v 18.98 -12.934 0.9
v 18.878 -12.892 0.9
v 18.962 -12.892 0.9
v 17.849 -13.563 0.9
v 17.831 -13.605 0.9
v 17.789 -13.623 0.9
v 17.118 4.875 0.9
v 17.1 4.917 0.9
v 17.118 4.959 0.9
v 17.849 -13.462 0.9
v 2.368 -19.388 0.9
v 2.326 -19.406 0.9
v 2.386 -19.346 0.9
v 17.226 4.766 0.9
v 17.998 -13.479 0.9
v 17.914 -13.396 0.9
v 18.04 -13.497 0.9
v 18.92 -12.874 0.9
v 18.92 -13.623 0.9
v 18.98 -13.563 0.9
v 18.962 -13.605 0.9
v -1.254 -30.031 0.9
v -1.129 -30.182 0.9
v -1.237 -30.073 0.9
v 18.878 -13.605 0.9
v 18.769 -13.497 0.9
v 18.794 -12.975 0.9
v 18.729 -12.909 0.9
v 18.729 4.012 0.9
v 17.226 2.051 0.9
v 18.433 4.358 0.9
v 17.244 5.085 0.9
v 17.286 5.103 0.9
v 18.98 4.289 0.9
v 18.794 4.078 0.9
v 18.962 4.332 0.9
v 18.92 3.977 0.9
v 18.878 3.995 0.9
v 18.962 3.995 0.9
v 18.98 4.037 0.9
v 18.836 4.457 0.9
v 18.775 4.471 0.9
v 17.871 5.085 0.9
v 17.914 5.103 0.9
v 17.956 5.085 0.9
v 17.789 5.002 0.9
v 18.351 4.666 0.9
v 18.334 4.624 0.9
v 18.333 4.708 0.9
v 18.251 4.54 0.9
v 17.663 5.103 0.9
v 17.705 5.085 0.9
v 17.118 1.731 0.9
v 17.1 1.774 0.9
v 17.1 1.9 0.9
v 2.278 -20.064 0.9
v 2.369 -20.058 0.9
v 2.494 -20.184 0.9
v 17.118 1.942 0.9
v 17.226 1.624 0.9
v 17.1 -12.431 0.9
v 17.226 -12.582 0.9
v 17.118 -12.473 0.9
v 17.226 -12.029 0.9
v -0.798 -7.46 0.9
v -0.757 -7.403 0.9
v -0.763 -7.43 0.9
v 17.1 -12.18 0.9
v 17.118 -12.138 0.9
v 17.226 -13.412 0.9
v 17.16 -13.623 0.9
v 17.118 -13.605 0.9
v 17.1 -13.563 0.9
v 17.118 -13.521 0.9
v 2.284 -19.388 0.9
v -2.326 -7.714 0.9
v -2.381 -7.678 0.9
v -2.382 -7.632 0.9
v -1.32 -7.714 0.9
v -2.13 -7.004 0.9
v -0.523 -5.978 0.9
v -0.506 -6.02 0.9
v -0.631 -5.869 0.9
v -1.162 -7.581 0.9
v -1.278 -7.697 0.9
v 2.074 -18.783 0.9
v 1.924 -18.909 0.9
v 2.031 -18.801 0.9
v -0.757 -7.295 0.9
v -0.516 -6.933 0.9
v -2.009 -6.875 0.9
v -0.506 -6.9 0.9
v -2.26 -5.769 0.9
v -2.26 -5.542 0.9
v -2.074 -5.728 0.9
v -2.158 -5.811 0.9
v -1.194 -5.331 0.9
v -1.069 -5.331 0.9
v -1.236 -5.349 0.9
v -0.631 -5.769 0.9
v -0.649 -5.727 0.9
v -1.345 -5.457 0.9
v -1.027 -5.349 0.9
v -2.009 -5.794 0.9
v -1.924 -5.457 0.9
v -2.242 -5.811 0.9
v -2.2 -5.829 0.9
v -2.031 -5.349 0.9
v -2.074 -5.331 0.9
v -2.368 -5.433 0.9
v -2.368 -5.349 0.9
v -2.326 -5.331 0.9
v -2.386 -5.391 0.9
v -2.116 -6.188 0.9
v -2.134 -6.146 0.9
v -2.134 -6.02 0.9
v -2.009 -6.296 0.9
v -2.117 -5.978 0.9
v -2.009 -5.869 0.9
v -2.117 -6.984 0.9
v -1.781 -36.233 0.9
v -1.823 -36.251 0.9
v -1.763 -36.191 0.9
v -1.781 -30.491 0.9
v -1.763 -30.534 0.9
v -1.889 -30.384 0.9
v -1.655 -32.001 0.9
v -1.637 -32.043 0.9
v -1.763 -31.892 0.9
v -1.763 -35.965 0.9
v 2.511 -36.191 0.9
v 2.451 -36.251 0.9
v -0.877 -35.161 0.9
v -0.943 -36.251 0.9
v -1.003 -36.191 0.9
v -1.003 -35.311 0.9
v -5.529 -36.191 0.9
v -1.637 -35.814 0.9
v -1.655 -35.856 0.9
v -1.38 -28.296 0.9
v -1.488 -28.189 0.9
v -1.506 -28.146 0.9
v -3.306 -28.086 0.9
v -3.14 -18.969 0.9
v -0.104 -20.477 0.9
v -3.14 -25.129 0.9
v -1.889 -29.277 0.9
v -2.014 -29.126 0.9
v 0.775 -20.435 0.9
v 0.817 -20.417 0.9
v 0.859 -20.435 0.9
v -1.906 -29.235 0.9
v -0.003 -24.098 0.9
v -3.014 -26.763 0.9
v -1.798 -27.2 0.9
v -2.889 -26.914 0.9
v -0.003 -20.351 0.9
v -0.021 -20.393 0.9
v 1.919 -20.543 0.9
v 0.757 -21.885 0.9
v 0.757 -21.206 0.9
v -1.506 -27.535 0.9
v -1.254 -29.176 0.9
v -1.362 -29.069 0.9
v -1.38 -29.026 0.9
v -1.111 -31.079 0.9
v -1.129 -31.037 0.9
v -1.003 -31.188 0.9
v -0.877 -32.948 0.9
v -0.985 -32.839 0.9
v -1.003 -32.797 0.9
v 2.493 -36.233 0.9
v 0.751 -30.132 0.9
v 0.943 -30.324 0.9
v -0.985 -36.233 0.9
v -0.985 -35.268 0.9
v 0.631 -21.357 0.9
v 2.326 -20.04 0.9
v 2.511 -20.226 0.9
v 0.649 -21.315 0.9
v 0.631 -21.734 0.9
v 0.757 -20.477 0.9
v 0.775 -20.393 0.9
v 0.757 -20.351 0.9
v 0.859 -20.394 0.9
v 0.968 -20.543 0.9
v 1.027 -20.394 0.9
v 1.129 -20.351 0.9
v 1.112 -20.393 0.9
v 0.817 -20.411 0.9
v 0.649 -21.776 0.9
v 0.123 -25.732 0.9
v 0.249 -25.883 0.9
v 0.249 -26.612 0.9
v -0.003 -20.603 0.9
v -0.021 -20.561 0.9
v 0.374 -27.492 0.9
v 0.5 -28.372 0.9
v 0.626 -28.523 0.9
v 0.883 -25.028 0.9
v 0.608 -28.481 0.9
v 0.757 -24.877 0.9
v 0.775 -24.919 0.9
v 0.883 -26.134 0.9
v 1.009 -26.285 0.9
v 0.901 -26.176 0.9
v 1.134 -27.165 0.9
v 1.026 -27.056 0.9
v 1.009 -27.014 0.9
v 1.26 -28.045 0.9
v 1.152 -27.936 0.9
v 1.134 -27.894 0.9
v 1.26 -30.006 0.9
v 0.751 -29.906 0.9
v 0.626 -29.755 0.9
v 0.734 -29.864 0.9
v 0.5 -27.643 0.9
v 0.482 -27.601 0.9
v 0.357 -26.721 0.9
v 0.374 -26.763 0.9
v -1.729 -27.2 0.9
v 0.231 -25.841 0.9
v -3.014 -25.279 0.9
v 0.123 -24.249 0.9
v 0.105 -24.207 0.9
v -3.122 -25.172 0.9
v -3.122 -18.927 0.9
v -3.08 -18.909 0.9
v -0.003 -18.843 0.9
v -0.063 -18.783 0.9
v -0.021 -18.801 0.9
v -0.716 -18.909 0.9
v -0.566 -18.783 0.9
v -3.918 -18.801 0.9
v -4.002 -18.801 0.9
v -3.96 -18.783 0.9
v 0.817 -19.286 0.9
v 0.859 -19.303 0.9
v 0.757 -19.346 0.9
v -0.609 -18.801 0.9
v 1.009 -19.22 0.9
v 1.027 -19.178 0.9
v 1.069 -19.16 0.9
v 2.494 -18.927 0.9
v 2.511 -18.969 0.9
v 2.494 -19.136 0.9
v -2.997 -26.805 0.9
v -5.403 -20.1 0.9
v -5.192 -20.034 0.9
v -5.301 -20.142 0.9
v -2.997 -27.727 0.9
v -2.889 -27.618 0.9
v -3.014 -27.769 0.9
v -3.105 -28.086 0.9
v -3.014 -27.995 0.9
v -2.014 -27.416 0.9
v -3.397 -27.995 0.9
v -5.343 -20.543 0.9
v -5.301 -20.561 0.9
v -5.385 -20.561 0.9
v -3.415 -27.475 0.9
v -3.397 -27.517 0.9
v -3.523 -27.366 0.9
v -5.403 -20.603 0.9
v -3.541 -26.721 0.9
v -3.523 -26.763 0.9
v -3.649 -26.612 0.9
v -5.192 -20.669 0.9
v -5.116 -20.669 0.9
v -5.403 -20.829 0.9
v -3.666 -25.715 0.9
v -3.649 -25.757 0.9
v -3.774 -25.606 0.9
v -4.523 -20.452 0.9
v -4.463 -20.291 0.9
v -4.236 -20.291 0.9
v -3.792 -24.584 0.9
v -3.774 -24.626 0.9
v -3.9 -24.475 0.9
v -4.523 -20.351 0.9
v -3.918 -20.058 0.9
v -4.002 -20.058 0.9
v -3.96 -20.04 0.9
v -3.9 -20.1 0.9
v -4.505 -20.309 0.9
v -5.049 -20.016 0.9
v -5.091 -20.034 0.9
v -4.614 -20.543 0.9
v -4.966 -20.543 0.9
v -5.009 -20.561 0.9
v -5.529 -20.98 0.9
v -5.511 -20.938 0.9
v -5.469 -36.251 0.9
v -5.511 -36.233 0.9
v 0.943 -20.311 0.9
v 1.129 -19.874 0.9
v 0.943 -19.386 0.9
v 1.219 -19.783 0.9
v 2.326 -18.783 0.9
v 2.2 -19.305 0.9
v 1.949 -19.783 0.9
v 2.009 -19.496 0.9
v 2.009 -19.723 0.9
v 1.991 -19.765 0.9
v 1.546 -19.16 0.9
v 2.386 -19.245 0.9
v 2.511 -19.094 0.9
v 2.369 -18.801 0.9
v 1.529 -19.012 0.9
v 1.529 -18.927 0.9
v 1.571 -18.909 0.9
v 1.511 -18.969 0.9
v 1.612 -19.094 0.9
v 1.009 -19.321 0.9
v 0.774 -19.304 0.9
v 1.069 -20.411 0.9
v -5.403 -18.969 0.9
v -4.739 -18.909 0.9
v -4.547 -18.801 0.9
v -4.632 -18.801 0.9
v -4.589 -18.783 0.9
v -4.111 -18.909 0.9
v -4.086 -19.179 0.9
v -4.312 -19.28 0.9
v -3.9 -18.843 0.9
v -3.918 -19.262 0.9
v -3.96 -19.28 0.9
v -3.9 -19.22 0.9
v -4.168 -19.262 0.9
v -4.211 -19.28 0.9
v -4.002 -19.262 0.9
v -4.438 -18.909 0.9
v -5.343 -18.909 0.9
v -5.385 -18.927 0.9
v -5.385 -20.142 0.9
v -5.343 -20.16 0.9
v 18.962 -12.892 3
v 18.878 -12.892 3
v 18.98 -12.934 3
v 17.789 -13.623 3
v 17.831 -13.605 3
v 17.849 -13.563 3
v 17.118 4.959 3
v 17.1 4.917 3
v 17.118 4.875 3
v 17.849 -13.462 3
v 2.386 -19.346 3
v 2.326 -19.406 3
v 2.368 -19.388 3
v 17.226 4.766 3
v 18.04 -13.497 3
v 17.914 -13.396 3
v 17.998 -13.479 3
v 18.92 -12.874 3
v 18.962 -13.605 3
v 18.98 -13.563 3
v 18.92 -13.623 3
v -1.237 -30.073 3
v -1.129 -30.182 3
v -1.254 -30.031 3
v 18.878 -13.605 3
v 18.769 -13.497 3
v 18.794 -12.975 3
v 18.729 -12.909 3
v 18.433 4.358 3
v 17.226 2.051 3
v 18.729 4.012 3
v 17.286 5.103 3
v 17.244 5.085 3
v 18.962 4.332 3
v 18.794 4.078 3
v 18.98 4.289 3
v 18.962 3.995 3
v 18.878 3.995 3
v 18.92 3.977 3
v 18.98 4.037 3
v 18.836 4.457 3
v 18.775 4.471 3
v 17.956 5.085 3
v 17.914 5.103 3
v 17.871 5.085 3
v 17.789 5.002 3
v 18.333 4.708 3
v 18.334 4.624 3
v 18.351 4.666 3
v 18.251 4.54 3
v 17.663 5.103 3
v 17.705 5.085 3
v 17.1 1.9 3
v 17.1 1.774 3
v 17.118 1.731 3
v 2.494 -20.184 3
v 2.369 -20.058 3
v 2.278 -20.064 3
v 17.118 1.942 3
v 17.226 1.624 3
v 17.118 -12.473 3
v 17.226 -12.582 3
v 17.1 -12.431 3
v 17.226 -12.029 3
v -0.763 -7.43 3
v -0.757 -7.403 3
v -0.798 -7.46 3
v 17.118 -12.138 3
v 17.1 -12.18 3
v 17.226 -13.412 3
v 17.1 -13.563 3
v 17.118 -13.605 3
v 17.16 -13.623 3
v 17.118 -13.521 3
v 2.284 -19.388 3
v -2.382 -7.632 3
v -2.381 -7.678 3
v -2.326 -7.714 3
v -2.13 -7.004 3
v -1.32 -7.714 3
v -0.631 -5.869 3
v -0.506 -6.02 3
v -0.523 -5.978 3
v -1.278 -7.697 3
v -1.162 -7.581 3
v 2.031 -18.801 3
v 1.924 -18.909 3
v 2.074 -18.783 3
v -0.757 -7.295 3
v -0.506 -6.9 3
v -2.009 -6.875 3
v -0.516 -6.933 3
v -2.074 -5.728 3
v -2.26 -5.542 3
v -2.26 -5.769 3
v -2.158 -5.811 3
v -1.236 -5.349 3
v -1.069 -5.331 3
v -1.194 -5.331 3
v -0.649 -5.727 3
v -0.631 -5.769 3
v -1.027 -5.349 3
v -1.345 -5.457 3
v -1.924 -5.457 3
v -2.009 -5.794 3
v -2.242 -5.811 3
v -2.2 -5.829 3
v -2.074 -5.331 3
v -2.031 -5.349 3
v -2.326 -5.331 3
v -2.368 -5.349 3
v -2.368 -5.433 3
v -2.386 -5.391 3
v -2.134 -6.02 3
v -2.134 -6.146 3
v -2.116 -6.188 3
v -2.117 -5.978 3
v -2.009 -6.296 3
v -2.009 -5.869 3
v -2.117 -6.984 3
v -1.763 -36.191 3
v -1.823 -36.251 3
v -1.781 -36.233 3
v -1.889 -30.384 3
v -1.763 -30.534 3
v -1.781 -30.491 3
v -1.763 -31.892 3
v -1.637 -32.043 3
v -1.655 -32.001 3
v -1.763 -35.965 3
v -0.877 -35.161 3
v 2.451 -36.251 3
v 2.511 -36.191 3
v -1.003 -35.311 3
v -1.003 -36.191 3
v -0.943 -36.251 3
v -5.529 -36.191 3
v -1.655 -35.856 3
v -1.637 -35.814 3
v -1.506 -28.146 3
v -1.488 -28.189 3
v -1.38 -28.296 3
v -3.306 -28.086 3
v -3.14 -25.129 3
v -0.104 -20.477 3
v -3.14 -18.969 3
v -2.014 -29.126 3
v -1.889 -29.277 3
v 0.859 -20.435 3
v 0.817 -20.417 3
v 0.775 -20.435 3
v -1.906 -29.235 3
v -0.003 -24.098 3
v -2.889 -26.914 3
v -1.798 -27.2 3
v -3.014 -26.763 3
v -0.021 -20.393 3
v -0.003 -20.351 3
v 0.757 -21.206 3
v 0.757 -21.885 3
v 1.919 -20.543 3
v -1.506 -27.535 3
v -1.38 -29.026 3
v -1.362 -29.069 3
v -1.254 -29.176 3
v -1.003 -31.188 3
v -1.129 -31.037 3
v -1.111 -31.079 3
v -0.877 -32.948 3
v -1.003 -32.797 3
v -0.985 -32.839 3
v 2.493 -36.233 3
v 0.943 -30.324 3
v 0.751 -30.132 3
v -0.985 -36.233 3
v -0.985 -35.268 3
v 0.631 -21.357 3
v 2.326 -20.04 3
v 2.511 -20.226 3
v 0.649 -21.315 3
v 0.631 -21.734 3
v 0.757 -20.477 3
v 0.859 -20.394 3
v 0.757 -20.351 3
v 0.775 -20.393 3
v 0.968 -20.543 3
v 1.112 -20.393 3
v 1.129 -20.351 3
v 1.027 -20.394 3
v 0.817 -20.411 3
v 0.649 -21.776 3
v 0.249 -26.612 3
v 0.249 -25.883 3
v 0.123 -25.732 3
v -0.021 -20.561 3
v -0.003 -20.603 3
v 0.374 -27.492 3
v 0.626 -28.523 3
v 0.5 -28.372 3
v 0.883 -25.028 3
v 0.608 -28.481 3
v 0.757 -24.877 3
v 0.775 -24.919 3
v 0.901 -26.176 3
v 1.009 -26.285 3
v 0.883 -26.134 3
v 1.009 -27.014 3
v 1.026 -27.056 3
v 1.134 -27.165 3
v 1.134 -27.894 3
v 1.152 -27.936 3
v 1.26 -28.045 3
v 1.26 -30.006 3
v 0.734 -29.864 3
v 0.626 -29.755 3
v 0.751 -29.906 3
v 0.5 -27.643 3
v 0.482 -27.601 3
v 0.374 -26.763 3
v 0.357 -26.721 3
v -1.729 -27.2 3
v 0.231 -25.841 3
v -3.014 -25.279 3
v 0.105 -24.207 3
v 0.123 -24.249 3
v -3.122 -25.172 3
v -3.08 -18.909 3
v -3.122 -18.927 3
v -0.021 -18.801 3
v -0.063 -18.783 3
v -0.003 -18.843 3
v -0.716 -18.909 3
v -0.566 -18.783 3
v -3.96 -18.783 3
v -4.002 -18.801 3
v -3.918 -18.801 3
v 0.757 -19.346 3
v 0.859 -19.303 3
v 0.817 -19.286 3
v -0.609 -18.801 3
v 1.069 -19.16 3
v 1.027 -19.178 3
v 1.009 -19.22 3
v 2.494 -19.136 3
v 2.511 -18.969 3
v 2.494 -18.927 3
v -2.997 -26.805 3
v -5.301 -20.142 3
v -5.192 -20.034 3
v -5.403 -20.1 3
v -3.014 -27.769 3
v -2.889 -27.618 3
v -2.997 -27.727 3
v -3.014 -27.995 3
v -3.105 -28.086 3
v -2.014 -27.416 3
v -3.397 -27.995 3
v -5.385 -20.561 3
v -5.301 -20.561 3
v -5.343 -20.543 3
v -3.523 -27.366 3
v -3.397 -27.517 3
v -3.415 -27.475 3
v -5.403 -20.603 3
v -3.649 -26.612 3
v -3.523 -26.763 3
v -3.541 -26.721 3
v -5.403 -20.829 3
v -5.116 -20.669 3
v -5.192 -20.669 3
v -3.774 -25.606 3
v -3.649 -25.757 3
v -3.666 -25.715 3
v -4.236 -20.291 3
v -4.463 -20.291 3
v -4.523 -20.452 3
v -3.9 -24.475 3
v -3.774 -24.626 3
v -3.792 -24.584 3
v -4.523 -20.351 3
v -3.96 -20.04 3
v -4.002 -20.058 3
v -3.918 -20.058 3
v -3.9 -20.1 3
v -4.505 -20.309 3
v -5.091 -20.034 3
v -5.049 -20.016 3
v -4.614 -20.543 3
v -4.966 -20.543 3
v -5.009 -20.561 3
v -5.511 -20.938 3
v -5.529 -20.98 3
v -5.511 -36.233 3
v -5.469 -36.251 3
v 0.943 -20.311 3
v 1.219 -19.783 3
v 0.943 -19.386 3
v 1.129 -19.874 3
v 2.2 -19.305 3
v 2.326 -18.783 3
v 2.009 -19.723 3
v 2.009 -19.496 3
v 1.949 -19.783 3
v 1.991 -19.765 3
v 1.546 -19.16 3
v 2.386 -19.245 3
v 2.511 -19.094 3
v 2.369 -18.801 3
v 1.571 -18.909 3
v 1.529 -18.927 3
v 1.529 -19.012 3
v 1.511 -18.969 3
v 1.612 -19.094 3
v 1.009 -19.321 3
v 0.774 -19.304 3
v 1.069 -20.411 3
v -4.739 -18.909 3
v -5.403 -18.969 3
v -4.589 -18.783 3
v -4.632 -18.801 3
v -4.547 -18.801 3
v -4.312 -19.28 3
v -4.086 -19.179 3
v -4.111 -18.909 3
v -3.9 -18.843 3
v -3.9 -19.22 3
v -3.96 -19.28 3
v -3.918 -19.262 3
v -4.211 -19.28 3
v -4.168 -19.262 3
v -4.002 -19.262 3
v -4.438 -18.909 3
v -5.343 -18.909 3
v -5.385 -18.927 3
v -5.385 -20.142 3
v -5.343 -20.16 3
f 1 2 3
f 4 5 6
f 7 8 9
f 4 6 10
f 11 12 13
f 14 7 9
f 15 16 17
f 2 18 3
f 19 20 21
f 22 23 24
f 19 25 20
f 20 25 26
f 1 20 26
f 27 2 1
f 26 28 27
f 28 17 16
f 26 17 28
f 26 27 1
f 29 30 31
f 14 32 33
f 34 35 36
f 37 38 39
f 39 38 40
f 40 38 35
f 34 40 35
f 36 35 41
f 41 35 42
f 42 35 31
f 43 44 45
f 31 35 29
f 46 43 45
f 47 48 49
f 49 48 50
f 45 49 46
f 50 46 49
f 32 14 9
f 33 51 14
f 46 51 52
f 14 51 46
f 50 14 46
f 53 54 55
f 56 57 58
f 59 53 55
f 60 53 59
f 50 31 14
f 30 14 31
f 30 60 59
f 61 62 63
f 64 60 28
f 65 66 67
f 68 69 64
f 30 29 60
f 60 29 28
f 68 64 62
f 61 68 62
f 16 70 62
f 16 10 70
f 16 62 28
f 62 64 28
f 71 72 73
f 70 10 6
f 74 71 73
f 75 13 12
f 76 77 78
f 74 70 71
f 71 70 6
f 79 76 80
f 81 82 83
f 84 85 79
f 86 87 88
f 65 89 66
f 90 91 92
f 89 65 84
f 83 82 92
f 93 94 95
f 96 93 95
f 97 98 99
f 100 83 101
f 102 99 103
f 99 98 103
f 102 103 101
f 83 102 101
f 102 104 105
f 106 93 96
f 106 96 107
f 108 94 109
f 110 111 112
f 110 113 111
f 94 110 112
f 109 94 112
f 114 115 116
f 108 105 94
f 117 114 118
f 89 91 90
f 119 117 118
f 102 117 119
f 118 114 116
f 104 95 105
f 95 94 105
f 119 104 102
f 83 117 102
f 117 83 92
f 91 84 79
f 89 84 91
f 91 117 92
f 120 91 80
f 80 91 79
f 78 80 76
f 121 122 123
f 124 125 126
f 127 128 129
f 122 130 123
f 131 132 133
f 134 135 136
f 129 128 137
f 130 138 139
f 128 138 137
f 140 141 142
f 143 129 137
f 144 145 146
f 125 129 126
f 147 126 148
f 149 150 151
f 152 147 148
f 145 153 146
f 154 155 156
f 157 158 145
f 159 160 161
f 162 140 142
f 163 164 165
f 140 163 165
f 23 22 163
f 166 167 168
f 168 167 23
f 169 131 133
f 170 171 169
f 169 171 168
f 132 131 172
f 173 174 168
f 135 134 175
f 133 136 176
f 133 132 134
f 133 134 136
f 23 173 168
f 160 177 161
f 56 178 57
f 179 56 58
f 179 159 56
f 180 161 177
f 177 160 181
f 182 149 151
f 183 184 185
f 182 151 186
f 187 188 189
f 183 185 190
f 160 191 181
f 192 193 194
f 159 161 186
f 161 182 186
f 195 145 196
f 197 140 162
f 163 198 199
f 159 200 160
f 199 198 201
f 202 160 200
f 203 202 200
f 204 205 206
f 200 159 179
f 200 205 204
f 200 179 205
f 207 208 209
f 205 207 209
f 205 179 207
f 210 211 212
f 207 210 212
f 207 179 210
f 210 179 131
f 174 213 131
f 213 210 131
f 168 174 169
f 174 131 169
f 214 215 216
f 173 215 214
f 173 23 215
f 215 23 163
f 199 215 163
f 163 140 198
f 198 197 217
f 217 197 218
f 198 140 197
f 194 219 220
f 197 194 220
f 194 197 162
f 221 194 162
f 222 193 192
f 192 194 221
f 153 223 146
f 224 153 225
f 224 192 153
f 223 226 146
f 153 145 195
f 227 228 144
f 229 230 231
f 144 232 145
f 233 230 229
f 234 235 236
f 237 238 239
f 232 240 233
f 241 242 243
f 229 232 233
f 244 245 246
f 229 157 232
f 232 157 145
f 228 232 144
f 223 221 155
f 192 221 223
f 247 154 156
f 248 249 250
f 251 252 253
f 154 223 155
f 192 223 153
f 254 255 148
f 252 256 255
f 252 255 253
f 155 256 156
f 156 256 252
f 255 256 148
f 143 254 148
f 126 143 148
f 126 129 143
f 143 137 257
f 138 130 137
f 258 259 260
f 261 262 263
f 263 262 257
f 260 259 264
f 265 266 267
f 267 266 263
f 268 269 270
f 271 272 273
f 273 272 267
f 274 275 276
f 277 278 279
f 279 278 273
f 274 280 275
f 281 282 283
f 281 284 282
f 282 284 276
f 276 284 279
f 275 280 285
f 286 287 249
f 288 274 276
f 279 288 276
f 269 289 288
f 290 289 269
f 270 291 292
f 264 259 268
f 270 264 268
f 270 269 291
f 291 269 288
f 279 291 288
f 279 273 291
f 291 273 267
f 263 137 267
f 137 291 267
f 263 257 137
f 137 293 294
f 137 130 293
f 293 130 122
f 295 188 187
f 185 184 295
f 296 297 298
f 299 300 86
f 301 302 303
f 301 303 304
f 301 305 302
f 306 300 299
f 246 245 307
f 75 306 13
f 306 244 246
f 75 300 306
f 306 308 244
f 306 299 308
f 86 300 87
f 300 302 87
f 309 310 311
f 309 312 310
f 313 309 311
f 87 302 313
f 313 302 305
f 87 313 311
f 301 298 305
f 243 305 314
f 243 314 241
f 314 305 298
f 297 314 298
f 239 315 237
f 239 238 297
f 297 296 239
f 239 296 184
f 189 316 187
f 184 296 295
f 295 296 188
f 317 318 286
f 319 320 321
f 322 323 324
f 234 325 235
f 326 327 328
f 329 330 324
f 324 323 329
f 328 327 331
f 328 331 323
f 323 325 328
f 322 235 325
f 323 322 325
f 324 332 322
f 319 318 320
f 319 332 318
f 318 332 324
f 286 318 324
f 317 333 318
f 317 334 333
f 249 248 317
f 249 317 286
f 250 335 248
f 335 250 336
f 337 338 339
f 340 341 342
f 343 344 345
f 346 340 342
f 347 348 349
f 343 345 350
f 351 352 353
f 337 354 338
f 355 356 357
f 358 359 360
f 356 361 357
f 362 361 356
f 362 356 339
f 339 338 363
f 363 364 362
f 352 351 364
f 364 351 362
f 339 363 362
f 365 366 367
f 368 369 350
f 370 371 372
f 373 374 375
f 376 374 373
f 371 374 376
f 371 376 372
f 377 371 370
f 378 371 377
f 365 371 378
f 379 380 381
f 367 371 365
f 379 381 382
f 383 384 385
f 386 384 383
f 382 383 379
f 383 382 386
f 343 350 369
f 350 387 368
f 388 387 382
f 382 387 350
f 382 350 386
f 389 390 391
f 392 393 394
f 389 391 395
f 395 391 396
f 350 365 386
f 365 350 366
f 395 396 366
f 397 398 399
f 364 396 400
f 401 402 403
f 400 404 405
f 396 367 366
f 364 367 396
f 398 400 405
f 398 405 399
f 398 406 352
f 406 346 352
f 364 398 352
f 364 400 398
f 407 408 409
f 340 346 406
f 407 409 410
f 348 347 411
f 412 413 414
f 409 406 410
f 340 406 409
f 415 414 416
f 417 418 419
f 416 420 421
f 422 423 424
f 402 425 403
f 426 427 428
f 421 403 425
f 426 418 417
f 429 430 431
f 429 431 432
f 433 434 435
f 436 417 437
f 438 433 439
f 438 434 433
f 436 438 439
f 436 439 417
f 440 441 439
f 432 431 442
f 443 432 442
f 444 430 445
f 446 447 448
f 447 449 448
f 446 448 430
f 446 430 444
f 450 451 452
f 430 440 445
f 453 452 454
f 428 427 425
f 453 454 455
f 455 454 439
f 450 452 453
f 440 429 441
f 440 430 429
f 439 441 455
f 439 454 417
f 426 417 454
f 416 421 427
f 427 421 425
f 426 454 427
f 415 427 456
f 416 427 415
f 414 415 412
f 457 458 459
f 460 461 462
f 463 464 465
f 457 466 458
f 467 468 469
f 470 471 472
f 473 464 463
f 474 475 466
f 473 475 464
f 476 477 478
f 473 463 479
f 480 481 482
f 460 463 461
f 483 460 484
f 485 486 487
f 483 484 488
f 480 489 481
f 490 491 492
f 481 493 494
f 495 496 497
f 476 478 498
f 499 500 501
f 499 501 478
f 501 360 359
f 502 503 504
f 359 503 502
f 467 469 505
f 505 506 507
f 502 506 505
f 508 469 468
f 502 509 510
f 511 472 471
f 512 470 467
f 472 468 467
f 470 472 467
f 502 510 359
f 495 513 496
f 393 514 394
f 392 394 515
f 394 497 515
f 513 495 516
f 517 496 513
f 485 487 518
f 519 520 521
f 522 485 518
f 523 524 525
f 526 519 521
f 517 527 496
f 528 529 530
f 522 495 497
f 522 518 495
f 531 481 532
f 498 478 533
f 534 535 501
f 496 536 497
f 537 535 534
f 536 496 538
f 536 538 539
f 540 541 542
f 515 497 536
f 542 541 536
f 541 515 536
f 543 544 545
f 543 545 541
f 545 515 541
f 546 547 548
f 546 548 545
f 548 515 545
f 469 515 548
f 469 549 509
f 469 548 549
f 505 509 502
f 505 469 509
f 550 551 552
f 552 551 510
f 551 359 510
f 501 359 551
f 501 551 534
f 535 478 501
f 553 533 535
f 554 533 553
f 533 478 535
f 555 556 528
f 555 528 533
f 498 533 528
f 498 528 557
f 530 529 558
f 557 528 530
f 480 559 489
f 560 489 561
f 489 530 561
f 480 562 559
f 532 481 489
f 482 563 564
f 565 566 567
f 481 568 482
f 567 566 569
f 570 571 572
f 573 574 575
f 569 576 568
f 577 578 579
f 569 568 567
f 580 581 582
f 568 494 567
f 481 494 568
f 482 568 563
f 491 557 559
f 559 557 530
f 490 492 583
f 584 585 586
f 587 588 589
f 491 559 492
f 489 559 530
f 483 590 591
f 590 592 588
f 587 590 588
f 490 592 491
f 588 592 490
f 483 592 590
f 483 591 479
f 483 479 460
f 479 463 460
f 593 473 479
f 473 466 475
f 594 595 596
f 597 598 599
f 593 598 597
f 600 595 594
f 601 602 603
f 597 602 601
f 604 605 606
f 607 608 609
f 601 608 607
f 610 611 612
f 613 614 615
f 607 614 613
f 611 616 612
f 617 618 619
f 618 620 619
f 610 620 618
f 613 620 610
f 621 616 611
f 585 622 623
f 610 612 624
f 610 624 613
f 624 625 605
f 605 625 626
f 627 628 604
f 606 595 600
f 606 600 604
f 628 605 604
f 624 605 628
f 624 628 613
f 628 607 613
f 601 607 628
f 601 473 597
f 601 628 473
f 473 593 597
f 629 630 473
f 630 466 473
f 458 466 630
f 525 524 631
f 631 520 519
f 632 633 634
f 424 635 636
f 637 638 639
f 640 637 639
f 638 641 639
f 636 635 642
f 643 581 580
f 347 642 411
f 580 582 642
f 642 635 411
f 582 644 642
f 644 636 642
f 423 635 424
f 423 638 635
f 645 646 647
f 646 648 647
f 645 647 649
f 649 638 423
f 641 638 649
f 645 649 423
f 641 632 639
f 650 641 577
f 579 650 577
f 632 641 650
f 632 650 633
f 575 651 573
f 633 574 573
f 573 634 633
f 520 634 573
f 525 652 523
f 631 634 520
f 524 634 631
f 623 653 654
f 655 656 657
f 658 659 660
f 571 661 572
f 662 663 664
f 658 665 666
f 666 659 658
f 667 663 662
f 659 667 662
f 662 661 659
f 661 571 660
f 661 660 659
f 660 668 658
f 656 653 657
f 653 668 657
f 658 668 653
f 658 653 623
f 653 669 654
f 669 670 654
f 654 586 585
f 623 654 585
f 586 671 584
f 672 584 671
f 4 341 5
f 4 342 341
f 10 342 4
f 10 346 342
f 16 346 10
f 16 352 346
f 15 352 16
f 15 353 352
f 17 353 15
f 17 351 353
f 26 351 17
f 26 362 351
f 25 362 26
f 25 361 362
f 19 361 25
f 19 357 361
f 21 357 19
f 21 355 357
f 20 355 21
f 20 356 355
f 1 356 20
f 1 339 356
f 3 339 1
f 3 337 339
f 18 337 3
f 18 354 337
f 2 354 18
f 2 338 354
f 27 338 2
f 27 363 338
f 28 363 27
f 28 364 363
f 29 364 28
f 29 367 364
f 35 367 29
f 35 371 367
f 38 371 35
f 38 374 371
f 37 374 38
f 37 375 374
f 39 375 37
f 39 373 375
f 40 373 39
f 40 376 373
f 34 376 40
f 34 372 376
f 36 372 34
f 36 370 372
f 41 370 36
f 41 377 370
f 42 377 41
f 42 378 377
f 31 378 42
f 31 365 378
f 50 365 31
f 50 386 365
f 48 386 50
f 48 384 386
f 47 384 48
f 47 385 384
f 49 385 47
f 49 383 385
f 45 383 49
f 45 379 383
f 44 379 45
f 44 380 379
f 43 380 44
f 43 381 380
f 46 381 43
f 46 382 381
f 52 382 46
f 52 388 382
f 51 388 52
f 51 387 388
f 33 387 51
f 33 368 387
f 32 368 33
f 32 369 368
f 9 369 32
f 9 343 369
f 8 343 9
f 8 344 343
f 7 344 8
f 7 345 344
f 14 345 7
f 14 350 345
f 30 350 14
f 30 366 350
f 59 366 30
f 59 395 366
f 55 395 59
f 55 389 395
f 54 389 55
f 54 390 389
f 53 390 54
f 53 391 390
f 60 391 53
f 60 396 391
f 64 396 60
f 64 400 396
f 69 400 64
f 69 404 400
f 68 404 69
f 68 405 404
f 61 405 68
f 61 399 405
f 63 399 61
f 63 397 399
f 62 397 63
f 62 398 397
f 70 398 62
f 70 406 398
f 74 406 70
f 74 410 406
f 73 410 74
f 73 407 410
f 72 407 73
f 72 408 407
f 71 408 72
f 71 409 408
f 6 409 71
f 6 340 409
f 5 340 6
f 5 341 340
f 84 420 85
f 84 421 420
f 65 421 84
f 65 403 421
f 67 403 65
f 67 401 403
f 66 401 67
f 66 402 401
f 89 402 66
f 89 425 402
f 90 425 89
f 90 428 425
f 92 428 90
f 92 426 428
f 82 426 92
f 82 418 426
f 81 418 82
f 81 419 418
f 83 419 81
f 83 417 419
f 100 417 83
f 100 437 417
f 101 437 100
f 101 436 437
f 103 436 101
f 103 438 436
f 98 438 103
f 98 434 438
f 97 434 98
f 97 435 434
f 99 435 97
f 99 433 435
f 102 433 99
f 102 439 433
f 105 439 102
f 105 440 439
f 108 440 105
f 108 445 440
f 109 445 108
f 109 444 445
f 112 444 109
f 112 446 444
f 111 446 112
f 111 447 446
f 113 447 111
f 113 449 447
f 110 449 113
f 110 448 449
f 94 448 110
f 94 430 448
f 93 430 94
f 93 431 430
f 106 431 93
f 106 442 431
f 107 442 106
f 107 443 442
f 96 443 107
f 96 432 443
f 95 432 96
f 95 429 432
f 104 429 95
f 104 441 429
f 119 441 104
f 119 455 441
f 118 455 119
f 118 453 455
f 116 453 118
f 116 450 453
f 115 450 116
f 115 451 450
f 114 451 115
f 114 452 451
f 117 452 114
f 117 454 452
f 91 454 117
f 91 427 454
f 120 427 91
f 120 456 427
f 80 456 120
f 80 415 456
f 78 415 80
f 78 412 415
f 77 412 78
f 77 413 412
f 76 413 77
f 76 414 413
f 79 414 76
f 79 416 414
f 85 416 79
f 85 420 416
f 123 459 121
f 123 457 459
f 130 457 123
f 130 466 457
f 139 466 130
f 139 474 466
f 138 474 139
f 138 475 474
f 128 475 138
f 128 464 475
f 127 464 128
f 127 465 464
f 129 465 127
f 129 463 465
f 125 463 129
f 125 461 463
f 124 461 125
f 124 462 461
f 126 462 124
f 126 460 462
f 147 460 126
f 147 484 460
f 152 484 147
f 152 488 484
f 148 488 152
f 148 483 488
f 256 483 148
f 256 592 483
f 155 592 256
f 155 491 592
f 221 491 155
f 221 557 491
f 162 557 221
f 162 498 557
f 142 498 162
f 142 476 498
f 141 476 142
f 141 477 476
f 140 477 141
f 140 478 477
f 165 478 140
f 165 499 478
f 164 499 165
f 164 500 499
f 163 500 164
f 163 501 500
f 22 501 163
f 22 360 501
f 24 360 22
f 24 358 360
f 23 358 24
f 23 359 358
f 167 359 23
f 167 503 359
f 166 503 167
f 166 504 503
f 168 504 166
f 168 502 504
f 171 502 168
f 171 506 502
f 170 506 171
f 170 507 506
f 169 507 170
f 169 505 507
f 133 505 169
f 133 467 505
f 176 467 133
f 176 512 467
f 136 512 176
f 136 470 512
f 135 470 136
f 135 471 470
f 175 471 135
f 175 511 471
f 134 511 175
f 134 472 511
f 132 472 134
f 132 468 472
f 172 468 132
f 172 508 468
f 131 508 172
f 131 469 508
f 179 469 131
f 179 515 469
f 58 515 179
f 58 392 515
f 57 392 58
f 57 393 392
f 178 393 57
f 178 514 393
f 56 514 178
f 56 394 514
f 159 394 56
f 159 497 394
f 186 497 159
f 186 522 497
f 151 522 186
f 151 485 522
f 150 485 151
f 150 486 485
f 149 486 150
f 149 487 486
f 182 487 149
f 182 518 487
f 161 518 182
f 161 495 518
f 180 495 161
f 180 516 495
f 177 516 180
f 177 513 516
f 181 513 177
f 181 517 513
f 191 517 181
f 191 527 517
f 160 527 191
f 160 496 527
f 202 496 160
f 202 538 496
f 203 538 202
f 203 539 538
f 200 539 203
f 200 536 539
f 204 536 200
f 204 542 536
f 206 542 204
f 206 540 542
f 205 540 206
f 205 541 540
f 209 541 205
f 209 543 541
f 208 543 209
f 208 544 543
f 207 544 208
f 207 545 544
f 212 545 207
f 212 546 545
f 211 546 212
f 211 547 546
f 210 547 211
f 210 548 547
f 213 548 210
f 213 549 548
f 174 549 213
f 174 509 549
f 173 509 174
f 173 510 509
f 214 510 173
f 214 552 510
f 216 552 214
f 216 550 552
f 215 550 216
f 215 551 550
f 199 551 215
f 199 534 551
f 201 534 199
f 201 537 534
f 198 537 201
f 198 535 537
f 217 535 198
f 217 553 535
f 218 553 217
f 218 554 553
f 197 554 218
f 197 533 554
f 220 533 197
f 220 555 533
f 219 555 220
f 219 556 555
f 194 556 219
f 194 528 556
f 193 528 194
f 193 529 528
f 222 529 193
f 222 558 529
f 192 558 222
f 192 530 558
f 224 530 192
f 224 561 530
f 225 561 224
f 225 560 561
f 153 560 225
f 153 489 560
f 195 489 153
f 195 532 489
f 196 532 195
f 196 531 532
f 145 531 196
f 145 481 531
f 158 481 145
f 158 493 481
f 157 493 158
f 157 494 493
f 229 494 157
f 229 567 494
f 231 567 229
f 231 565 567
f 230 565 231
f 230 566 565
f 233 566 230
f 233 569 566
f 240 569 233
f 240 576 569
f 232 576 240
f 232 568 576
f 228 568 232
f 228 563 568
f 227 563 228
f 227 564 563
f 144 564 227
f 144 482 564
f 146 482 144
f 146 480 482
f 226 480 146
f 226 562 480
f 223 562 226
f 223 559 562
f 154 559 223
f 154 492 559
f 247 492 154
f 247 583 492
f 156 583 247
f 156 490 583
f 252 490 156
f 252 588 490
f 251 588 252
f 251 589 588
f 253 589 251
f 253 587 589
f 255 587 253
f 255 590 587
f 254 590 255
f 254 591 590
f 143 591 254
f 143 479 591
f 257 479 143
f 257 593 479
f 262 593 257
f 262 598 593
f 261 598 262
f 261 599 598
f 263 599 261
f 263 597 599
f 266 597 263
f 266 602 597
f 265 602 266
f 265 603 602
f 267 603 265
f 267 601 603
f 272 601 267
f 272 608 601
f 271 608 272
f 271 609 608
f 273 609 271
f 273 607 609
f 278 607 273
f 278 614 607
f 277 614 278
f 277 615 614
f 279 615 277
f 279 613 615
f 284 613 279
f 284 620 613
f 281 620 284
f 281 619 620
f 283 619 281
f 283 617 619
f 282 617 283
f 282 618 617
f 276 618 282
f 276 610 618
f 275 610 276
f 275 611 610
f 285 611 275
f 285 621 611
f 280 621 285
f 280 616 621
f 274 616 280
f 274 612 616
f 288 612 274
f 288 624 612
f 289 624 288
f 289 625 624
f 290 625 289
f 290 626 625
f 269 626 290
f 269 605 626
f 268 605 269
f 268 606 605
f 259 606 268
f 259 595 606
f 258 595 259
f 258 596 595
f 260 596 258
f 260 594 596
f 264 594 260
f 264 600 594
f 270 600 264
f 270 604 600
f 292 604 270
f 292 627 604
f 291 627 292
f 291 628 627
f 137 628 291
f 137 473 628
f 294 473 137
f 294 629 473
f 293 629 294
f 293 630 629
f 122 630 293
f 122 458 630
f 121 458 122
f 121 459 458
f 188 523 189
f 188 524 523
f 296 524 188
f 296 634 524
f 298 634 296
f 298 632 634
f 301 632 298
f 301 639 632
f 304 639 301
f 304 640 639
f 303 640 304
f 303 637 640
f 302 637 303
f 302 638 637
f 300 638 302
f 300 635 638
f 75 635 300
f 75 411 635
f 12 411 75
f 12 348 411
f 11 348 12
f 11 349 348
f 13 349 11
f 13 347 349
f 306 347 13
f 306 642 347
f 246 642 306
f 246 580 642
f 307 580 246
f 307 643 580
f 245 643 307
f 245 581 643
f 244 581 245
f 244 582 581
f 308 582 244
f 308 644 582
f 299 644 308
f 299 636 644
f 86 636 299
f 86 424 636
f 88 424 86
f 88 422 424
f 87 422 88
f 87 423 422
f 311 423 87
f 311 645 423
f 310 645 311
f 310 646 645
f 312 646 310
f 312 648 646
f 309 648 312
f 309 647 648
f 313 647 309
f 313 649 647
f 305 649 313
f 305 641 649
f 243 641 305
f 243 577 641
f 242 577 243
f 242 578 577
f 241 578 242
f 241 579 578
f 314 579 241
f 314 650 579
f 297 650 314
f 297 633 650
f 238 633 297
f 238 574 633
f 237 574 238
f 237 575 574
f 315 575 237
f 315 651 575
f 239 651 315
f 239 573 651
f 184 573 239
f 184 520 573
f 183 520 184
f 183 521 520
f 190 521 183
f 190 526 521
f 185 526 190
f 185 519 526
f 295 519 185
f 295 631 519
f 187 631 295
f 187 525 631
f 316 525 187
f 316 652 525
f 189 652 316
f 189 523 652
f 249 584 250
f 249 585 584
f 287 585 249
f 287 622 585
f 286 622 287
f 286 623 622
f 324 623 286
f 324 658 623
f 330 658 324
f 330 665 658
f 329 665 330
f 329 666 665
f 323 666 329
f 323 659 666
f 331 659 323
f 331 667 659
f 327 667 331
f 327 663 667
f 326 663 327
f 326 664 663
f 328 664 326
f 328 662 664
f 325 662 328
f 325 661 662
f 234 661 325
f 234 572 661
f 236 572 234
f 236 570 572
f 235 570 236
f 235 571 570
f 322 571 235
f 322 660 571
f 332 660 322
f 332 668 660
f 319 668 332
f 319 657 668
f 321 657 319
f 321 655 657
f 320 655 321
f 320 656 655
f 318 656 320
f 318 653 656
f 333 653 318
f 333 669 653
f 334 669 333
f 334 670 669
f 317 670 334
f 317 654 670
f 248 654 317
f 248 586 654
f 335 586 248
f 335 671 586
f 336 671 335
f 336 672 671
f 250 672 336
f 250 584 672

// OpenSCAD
$fn = 24;
translate([0, -2.500, 0.900])
  linear_extrude(height=2.100) {
offset(r=0.06, $fn=8) {
    polygon(points=[[2.326,-16.343],[2.074,-16.343],[1.949,-16.469],[1.069,-16.469],[1.571,-16.469],[1.697,-16.594],[1.571,-16.720],[1.069,-16.720],[1.069,-16.846],[0.943,-16.971],[0.817,-16.846],[0.817,-16.469],[0.817,-18.731],[0.691,-18.857],[0.691,-19.234],[0.817,-19.360],[0.817,-22.377],[0.943,-22.503],[0.943,-23.634],[1.069,-23.760],[1.069,-24.514],[1.194,-24.640],[1.194,-25.394],[1.320,-25.520],[1.320,-27.531],[0.943,-27.909],[0.691,-27.657],[0.691,-27.406],[0.566,-27.280],[0.566,-26.023],[0.440,-25.897],[0.440,-25.143],[0.314,-25.017],[0.314,-24.263],[0.189,-24.137],[0.189,-23.383],[0.063,-23.257],[0.063,-21.749],[-0.063,-21.623],[-0.063,-18.103],[-0.189,-17.977],[-0.063,-17.851],[-0.063,-16.343],[-0.566,-16.343],[-0.691,-16.469],[-3.080,-16.469],[-3.080,-22.629],[-2.954,-22.754],[-2.954,-24.263],[-2.829,-24.389],[-2.829,-25.143],[-2.954,-25.269],[-2.954,-25.520],[-3.080,-25.646],[-3.331,-25.646],[-3.457,-25.520],[-3.457,-25.017],[-3.583,-24.891],[-3.583,-24.263],[-3.709,-24.137],[-3.709,-23.257],[-3.834,-23.131],[-3.834,-22.126],[-3.960,-22.000],[-3.960,-17.600],[-4.211,-17.851],[-4.463,-17.851],[-4.463,-17.977],[-4.589,-18.103],[-4.966,-18.103],[-5.091,-18.229],[-5.217,-18.229],[-5.343,-18.103],[-5.343,-18.354],[-5.469,-18.480],[-5.469,-33.691],[-1.823,-33.691],[-1.823,-33.440],[-1.697,-33.314],[-1.697,-29.543],[-1.823,-29.417],[-1.823,-28.034],[-1.949,-27.909],[-1.949,-26.777],[-2.074,-26.651],[-2.074,-24.891],[-1.823,-24.640],[-1.697,-24.640],[-1.446,-25.017],[-1.446,-25.646],[-1.320,-25.771],[-1.320,-26.526],[-1.194,-26.651],[-1.194,-27.531],[-1.069,-27.657],[-1.069,-28.537],[-0.943,-28.663],[-0.943,-30.297],[-0.817,-30.423],[-0.817,-32.686],[-0.943,-32.811],[-0.943,-33.691],[2.451,-33.691],[2.451,-17.726],[2.326,-17.600],[2.326,-17.474],[2.326,-17.600],[1.949,-18.103],[0.943,-18.103],[0.817,-17.977],[0.817,-17.851],[0.943,-17.726],[1.069,-17.851],[1.069,-17.349],[1.194,-17.223],[1.949,-17.223],[1.949,-16.971],[2.200,-16.720],[2.326,-16.846],[2.326,-16.720],[2.451,-16.594],[2.451,-16.469]], paths=[[0,1,2,3,4,5,6,7,8,9,10,11,12,13,14,15,16,17,18,19,20,21,22,23,24,25,26,27,28,29,30,31,32,33,34,35,36,37,38,39,40,41,42,43,44,45,46,47,48,49,50,51,52,53,54,55,56,57,58,59,60,61,62,63,64,65,66,67,68,69,70,71,72,73,74,75,76,77,78,79,80,81,82,83,84,85,86,87,88,89,90,91,92,93,94,95,96,97,98,99,100,101,102,103,104,105,106,107,108,109,110,111,112,113,114,115,116,117,118,119,120,121]]);
    polygon(points=[[-3.960,-16.343],[-4.086,-16.469],[-4.463,-16.469],[-4.589,-16.343],[-4.714,-16.469],[-5.343,-16.469],[-5.343,-17.726],[-5.343,-17.600],[-5.217,-17.474],[-5.091,-17.474],[-4.337,-16.720],[-4.211,-16.720],[-4.086,-16.594],[-3.960,-16.720]], paths=[[0,1,2,3,4,5,6,7,8,9,10,11,12,13]]);
    polygon(points=[[-2.326,-2.891],[-2.200,-3.017],[-2.200,-3.269],[-2.074,-3.143],[-1.949,-3.269],[-1.949,-3.394],[-2.074,-3.520],[-2.074,-3.646],[-1.949,-3.771],[-1.949,-4.400],[-2.074,-4.526],[-2.326,-5.154],[-1.320,-5.154],[-1.194,-5.029],[-0.817,-4.903],[-0.817,-4.777],[-0.566,-4.400],[-0.566,-3.520],[-0.691,-3.394],[-0.691,-3.269],[-1.069,-2.891],[-1.194,-2.891],[-1.320,-3.017],[-1.949,-3.017],[-2.074,-2.891]], paths=[[0,1,2,3,4,5,6,7,8,9,10,11,12,13,14,15,16,17,18,19,20,21,22,23,24]]);
    polygon(points=[[17.286,7.543],[17.160,7.417],[17.286,7.291],[17.286,4.526],[17.160,4.400],[17.160,4.274],[17.286,4.149],[17.286,-9.554],[17.160,-9.680],[17.160,-9.931],[17.286,-10.057],[17.286,-10.937],[17.160,-11.063],[17.789,-11.063],[17.789,-10.937],[17.914,-10.811],[18.040,-10.937],[18.794,-10.937],[18.920,-11.063],[18.920,6.789],[18.794,6.914],[18.417,6.789],[18.166,7.040],[18.291,7.166],[17.914,7.543],[17.789,7.417],[17.663,7.543],[18.794,6.663],[18.920,6.537],[18.920,-10.434],[18.794,-10.560],[18.669,-10.434],[18.669,6.537]], paths=[[0,1,2,3,4,5,6,7,8,9,10,11,12,13,14,15,16,17,18,19,20,21,22,23,24,25,26],[27,28,29,30,31,32]]);
}
}
